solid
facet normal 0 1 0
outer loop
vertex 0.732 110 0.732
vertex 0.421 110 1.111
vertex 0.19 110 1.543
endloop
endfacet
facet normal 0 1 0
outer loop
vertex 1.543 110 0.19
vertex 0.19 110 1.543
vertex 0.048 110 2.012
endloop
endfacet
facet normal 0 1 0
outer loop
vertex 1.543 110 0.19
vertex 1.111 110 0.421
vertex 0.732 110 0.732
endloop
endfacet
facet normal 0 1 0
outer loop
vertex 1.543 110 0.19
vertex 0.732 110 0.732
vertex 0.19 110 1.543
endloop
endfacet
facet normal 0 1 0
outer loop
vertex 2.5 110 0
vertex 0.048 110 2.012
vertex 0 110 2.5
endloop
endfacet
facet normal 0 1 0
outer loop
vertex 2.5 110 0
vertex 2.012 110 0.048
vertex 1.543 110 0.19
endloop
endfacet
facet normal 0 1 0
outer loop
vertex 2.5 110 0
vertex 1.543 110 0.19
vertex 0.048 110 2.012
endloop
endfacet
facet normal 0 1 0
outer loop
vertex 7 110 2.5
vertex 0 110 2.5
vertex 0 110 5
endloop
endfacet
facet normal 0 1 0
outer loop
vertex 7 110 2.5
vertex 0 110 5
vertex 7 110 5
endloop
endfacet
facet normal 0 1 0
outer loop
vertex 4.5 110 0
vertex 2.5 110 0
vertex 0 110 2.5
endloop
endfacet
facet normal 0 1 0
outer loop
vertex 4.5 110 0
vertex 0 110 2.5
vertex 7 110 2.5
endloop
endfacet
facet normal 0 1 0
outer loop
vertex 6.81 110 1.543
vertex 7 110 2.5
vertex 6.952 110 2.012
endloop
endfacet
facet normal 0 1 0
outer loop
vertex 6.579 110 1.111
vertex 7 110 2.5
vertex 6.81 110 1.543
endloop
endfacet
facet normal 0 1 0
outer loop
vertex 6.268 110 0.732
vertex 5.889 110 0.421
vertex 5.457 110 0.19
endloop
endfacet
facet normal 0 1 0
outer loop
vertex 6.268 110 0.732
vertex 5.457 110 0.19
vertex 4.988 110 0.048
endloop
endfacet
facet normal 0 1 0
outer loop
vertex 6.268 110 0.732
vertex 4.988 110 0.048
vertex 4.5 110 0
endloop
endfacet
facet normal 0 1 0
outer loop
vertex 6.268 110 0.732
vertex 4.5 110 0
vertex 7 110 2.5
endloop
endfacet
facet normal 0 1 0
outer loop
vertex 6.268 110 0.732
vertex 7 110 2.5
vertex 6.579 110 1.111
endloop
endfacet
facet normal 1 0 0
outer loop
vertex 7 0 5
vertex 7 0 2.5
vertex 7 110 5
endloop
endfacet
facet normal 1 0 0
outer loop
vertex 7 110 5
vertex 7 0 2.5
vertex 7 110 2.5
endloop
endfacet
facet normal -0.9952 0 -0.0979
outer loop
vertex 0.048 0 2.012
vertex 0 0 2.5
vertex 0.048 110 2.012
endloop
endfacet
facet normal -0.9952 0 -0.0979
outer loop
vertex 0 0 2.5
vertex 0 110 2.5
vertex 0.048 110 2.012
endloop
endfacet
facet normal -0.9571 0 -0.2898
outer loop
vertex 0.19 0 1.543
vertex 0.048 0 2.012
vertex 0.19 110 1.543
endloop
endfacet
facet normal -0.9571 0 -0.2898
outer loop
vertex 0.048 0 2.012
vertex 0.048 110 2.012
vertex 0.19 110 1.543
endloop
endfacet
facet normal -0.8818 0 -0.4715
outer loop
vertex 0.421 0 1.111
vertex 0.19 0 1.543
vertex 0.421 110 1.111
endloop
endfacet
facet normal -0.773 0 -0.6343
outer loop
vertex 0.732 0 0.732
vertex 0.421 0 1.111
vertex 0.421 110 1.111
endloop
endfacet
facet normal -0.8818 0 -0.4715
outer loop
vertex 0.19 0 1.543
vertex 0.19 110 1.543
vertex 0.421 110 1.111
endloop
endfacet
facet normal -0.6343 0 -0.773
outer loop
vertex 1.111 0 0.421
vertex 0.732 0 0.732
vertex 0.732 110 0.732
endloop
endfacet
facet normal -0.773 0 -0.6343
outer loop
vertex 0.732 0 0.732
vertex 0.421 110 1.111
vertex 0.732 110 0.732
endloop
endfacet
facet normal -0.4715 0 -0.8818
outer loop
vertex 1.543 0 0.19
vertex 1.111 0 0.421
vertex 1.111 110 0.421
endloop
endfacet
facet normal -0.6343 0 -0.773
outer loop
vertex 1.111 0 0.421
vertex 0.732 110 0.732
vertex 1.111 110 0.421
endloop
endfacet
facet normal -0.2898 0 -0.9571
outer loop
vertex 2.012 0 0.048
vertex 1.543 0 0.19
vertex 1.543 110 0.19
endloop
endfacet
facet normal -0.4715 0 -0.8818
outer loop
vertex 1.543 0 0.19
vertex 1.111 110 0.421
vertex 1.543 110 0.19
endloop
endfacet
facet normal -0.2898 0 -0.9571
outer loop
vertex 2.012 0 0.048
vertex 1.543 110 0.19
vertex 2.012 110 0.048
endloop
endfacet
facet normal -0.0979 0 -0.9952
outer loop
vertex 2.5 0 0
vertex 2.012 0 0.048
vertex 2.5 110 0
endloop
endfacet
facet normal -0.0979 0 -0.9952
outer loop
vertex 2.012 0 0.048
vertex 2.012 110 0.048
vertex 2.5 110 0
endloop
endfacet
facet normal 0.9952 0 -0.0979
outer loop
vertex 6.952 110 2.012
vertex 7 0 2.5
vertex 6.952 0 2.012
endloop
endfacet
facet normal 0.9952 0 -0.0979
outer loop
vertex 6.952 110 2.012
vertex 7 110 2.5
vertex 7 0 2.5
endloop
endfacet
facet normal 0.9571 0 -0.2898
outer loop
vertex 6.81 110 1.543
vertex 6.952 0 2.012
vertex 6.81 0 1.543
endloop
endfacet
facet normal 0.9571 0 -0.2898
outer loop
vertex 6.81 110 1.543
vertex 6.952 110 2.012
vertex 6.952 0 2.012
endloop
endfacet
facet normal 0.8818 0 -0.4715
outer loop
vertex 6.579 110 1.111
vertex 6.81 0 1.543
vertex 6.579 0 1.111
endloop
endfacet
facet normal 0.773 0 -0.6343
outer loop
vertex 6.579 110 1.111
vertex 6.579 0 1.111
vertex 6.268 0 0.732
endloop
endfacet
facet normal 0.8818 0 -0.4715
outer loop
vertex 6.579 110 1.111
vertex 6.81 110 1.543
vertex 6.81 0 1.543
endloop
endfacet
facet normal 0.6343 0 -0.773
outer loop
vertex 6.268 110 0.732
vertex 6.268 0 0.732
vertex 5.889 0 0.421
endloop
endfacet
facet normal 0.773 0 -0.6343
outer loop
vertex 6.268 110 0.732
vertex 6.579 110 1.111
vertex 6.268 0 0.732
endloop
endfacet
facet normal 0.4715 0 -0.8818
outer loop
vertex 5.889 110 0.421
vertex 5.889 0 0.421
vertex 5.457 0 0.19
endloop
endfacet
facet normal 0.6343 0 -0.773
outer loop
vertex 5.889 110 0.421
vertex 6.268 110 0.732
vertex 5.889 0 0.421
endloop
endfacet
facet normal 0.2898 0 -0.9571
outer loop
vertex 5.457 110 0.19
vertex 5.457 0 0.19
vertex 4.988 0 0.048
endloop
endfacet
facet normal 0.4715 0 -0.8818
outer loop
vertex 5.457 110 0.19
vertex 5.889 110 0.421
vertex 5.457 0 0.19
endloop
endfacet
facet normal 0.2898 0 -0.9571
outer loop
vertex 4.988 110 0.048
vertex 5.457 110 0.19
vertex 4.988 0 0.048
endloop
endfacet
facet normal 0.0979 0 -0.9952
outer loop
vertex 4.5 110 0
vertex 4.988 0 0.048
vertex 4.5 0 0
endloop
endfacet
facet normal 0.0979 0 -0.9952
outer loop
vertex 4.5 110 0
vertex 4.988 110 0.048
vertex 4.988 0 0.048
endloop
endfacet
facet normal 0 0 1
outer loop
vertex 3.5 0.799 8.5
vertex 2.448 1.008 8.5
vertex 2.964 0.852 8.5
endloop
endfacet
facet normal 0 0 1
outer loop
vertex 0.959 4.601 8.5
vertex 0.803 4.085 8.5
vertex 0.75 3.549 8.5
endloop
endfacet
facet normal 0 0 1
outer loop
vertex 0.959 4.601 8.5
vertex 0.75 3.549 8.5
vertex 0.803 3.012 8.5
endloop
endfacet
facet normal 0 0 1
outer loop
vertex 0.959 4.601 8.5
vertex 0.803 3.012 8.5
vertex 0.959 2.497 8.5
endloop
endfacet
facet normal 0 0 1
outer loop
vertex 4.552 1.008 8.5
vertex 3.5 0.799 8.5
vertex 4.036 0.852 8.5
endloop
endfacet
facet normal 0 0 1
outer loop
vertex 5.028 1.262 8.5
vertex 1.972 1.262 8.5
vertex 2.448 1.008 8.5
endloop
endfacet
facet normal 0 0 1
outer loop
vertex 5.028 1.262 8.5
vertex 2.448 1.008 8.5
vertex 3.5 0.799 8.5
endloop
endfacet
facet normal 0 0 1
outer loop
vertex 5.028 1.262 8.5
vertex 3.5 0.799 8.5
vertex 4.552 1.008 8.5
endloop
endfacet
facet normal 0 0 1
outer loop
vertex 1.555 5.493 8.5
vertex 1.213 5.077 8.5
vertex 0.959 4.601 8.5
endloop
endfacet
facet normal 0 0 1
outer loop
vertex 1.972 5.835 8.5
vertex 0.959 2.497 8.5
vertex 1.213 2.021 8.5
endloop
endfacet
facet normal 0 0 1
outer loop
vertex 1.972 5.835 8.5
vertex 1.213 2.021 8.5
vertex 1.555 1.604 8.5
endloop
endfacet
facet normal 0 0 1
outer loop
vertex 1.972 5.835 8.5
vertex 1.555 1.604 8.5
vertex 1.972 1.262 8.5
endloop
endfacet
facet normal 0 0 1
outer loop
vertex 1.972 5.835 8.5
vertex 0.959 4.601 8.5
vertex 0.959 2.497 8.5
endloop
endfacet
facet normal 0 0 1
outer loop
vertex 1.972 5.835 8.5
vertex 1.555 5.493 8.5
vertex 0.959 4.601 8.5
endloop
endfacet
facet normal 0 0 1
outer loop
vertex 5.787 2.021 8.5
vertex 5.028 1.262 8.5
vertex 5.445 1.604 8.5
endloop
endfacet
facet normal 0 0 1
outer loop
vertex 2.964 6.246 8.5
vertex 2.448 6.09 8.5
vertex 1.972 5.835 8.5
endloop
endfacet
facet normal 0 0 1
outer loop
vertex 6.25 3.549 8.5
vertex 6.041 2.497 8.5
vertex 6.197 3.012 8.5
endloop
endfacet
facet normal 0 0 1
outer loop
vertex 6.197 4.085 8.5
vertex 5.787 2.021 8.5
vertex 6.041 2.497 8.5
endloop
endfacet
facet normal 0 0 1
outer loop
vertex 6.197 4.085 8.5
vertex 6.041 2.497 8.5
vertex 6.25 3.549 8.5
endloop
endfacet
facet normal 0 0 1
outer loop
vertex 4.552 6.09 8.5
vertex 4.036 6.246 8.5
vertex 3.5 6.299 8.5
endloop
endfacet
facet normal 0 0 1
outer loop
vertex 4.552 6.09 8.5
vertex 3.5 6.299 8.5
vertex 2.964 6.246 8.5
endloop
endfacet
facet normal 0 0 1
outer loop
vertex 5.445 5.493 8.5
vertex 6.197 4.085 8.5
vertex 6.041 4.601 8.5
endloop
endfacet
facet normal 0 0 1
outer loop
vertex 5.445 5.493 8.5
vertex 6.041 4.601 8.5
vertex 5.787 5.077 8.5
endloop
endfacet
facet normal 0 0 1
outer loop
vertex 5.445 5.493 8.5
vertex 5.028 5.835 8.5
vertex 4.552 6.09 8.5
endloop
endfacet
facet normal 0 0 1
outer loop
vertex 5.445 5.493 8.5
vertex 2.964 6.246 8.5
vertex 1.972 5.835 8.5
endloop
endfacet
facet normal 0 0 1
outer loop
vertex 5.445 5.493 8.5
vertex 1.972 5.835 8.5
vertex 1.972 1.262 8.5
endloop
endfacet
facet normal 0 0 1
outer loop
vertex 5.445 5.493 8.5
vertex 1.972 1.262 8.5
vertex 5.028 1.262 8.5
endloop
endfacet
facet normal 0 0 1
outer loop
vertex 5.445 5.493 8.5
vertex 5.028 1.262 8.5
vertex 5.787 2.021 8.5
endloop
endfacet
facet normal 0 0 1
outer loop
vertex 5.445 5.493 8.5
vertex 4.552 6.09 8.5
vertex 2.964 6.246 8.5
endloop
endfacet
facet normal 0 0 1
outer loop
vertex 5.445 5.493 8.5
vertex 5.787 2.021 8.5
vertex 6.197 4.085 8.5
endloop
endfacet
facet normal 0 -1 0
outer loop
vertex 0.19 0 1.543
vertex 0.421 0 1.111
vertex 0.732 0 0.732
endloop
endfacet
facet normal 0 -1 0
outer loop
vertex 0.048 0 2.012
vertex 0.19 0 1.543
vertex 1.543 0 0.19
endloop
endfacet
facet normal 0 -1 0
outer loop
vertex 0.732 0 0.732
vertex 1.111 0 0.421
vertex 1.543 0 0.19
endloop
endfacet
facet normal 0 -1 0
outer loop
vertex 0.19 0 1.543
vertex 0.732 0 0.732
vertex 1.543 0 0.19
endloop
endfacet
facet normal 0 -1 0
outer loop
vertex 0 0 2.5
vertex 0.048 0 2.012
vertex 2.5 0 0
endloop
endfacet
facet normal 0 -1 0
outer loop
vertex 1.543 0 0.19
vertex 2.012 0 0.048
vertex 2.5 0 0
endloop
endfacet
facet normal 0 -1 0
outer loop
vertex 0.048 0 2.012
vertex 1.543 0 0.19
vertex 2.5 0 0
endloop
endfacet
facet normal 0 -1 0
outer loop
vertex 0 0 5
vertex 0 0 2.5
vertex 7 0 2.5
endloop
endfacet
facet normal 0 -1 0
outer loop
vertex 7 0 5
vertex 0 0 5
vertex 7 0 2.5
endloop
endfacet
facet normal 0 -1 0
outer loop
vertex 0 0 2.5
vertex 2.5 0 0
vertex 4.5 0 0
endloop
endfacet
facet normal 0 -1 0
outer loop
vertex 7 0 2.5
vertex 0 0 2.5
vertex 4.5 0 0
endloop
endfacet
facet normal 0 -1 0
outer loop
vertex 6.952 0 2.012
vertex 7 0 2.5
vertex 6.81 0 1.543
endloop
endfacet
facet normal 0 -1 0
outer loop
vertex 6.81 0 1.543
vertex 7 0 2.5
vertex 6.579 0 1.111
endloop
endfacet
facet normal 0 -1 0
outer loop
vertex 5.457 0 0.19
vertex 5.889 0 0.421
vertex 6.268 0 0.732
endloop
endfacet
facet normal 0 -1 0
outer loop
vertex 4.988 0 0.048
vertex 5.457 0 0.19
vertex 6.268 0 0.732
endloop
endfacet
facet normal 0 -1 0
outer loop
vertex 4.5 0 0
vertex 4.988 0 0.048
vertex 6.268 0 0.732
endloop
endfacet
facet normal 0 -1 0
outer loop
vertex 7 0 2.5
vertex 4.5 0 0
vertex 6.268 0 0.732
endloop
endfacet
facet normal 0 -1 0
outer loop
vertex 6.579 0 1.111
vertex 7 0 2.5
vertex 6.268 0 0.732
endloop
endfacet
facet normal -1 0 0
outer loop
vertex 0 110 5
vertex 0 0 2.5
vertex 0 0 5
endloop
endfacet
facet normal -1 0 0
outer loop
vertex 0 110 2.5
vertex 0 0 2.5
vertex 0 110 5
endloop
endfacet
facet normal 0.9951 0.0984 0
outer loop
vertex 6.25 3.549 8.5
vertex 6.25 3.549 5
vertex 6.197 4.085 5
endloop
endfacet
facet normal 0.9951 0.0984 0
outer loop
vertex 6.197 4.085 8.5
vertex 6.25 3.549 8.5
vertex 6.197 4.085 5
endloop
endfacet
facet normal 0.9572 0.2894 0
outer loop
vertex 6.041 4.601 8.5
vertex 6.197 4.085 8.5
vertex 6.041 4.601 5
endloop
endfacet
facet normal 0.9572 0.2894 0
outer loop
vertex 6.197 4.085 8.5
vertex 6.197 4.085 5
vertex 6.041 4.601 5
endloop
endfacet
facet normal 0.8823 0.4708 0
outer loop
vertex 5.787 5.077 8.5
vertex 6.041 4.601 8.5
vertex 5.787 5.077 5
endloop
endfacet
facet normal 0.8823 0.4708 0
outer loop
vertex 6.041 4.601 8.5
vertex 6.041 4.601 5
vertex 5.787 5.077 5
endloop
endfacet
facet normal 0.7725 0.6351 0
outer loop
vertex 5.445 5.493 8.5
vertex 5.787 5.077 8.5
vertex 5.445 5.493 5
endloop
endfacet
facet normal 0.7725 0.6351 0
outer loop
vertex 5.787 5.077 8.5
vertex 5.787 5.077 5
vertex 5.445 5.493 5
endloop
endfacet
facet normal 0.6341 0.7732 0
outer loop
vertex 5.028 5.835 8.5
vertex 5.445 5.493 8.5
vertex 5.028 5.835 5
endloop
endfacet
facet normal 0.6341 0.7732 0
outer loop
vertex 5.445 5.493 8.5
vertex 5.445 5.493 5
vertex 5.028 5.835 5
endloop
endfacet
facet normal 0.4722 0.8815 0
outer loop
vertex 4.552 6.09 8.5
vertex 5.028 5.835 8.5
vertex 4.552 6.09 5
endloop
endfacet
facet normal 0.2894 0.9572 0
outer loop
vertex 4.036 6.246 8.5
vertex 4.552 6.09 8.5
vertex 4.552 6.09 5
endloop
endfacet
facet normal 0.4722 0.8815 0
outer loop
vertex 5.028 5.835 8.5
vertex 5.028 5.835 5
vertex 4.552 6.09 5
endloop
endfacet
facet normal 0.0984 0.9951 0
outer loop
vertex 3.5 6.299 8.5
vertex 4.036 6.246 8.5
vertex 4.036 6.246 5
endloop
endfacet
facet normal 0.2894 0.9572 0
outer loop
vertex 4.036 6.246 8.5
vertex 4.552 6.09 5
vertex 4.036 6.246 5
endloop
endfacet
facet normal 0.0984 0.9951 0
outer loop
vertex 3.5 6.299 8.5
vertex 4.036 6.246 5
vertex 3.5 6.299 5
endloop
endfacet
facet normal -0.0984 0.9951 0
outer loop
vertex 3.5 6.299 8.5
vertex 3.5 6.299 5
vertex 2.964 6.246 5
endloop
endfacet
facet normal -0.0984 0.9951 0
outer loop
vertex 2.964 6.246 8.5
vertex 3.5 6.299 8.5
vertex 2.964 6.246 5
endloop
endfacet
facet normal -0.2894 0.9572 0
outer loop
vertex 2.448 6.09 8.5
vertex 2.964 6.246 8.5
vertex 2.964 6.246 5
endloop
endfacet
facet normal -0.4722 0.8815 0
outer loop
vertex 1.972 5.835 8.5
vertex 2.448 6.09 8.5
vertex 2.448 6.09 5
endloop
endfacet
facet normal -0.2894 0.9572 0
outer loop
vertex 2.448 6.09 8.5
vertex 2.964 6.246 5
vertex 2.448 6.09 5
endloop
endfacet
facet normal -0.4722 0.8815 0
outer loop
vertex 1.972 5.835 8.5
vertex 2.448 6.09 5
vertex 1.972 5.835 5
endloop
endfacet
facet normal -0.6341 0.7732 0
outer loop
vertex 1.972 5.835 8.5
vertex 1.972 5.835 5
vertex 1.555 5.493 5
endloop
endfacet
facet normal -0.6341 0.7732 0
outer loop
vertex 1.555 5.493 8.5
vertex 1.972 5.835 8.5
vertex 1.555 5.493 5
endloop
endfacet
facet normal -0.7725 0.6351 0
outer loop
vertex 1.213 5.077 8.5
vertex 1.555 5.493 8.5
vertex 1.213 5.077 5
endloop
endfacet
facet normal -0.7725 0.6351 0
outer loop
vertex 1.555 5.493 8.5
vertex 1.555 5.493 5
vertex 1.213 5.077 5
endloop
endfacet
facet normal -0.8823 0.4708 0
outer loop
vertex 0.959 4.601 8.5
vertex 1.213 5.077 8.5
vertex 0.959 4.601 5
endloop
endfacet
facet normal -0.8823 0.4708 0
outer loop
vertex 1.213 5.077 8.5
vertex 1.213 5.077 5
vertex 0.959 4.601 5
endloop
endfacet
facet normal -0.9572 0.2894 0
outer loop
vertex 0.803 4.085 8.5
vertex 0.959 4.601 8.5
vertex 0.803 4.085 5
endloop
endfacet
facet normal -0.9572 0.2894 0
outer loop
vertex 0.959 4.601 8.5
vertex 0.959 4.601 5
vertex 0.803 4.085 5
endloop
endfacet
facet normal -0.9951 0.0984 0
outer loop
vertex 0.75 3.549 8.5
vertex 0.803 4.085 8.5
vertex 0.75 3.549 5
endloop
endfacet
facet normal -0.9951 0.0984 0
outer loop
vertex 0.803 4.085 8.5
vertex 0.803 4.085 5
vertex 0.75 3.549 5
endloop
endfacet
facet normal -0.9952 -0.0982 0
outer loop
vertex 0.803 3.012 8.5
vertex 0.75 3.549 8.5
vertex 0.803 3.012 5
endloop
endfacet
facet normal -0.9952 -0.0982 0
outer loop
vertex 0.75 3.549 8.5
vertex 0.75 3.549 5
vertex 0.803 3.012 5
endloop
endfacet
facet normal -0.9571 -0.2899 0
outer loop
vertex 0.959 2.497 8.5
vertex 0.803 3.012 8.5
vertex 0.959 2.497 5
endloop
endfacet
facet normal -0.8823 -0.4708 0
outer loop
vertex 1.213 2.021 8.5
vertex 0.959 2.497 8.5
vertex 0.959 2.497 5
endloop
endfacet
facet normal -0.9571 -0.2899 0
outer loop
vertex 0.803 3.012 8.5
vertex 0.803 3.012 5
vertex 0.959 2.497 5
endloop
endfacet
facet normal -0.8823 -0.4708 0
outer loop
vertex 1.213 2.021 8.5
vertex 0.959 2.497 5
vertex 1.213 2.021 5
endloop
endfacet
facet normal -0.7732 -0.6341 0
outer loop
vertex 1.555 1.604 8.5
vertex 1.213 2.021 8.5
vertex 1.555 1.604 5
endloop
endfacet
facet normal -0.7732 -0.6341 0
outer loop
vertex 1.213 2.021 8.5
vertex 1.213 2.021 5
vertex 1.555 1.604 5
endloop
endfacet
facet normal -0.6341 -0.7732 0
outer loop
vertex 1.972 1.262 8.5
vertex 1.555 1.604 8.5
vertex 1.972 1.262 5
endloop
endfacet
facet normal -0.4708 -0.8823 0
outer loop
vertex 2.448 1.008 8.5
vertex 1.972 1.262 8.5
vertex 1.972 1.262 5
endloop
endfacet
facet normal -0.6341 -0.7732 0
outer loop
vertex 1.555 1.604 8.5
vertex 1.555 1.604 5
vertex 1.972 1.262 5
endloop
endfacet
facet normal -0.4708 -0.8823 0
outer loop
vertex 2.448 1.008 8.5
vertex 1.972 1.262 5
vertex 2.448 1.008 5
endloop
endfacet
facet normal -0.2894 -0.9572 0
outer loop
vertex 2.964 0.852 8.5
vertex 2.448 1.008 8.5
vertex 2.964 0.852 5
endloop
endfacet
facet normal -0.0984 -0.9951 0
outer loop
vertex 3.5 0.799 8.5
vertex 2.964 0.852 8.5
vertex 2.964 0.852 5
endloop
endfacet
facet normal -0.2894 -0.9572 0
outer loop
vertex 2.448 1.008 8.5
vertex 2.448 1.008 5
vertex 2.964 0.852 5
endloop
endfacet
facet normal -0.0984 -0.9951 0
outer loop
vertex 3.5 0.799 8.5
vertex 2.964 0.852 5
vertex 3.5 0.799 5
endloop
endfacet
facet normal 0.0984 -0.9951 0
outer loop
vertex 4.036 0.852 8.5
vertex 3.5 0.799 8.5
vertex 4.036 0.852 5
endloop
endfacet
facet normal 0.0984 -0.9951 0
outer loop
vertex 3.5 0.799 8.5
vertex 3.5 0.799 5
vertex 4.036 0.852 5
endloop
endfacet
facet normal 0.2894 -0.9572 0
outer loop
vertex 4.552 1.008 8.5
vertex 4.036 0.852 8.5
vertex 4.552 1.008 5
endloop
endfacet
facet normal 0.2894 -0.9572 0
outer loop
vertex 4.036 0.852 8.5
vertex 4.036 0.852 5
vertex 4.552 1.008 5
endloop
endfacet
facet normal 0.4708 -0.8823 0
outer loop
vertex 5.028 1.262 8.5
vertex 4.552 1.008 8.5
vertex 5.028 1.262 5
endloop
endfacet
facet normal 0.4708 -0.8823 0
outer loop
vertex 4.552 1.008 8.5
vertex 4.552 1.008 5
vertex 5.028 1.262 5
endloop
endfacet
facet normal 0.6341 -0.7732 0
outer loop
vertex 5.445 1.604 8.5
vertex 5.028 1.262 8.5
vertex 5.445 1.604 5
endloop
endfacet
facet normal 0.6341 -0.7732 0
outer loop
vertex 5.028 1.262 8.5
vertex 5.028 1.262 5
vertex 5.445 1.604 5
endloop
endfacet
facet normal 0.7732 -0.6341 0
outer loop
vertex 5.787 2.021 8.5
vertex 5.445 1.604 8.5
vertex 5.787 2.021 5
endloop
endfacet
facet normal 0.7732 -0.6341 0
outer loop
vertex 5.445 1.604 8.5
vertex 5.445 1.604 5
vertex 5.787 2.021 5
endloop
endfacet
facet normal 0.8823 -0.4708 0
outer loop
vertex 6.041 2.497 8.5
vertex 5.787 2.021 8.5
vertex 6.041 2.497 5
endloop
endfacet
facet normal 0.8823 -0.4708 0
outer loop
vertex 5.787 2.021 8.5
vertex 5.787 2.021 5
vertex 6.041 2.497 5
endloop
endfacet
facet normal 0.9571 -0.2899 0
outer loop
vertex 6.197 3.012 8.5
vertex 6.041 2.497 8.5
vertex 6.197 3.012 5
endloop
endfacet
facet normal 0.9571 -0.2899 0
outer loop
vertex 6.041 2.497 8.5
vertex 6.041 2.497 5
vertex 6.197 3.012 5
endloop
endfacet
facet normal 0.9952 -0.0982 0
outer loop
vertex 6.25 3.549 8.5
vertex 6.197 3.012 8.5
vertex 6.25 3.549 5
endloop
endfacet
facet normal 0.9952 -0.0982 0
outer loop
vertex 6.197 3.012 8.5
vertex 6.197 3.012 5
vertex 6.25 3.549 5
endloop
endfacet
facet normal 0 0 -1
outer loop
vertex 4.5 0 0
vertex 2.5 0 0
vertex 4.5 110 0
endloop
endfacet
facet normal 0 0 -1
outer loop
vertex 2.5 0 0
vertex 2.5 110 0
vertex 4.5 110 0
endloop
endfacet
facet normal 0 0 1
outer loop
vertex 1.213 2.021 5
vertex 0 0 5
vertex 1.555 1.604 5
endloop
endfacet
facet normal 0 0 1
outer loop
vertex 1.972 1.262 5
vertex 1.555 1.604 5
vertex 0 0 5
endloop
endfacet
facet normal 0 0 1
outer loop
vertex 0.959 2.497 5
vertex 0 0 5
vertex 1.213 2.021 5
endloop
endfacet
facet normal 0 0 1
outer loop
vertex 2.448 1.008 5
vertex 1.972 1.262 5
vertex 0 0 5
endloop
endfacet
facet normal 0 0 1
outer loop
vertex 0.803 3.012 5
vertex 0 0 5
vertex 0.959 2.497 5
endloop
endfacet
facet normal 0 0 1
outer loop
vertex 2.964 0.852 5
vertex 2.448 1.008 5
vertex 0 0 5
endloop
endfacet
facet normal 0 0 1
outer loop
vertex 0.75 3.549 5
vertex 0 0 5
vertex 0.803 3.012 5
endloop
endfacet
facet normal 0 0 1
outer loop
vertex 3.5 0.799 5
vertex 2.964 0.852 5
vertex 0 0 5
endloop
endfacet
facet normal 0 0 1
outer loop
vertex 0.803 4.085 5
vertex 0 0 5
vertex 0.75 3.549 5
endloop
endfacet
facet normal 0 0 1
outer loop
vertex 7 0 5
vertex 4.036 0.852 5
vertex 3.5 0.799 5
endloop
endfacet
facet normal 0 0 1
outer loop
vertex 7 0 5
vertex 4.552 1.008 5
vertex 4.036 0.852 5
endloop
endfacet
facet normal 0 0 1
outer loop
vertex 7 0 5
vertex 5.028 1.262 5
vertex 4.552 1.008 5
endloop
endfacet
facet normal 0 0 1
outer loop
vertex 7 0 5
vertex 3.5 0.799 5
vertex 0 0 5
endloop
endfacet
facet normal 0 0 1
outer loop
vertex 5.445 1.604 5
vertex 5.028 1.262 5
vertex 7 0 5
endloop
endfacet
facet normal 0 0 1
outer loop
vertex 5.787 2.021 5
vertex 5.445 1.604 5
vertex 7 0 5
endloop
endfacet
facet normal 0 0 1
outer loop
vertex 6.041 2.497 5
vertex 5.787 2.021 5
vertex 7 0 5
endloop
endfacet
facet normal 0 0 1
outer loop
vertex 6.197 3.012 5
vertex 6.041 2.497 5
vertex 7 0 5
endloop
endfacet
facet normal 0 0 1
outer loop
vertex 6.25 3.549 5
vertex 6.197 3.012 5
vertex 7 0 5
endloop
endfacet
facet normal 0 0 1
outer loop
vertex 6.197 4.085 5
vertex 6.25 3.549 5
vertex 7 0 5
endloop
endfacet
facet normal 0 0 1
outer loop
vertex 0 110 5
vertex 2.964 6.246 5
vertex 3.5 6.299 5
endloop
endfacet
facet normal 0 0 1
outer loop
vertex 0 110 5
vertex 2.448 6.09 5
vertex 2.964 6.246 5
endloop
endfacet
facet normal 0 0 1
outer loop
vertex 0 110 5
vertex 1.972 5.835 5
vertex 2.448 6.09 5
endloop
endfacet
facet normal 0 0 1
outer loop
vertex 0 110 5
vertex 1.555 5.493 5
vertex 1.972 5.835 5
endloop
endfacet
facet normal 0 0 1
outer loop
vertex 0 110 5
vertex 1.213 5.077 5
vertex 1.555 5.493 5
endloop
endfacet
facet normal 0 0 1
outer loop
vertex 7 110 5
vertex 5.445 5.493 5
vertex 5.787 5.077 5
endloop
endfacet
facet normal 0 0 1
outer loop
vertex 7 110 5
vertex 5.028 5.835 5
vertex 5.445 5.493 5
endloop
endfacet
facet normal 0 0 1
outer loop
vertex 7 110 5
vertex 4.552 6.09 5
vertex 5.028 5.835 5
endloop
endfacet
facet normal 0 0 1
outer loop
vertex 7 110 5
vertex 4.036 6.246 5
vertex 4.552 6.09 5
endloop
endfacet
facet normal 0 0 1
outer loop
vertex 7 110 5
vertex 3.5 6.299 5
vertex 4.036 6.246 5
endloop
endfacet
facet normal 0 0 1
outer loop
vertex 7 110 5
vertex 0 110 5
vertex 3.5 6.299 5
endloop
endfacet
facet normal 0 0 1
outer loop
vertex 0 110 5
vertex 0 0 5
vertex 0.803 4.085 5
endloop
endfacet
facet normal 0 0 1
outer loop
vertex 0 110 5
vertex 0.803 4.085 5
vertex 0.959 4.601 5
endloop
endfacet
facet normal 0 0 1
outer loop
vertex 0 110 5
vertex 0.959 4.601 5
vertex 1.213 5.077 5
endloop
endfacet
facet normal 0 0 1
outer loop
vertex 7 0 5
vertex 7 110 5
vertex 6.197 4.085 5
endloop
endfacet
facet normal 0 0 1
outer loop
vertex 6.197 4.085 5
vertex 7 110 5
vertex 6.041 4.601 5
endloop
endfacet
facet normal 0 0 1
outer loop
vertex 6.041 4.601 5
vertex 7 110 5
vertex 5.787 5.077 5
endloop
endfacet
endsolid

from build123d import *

# Parameters (mm, degrees)
SKETCH1_W           = 7
SKETCH1_H           = 110
BOSS_EXTRUDE1_DEPTH = 5
FILLET4_R           = 2.5
SKETCH2_R           = 2.75
BOSS_EXTRUDE2_DEPTH = 3.5


with BuildPart() as part:
    # Sketch1 → Boss-Extrude1 (new body)
    with BuildSketch(Plane.XY):
        with Locations((3.5, 55)):
            Rectangle(SKETCH1_W, SKETCH1_H)
    extrude(amount=BOSS_EXTRUDE1_DEPTH)

    # Fillet4
    fillet4_edges = [part.edges().sort_by_distance(p)[0] for p in [
        (7, 55, 0),
        (0, 55, 0),
    ]]
    fillet(fillet4_edges, radius=FILLET4_R)

    # Sketch2 → Boss-Extrude2 (add)
    with BuildSketch(Plane.XY.offset(5)):
        with Locations((3.5, 3.548899595)):
            Circle(SKETCH2_R)
    extrude(amount=BOSS_EXTRUDE2_DEPTH)


solid = part.part
